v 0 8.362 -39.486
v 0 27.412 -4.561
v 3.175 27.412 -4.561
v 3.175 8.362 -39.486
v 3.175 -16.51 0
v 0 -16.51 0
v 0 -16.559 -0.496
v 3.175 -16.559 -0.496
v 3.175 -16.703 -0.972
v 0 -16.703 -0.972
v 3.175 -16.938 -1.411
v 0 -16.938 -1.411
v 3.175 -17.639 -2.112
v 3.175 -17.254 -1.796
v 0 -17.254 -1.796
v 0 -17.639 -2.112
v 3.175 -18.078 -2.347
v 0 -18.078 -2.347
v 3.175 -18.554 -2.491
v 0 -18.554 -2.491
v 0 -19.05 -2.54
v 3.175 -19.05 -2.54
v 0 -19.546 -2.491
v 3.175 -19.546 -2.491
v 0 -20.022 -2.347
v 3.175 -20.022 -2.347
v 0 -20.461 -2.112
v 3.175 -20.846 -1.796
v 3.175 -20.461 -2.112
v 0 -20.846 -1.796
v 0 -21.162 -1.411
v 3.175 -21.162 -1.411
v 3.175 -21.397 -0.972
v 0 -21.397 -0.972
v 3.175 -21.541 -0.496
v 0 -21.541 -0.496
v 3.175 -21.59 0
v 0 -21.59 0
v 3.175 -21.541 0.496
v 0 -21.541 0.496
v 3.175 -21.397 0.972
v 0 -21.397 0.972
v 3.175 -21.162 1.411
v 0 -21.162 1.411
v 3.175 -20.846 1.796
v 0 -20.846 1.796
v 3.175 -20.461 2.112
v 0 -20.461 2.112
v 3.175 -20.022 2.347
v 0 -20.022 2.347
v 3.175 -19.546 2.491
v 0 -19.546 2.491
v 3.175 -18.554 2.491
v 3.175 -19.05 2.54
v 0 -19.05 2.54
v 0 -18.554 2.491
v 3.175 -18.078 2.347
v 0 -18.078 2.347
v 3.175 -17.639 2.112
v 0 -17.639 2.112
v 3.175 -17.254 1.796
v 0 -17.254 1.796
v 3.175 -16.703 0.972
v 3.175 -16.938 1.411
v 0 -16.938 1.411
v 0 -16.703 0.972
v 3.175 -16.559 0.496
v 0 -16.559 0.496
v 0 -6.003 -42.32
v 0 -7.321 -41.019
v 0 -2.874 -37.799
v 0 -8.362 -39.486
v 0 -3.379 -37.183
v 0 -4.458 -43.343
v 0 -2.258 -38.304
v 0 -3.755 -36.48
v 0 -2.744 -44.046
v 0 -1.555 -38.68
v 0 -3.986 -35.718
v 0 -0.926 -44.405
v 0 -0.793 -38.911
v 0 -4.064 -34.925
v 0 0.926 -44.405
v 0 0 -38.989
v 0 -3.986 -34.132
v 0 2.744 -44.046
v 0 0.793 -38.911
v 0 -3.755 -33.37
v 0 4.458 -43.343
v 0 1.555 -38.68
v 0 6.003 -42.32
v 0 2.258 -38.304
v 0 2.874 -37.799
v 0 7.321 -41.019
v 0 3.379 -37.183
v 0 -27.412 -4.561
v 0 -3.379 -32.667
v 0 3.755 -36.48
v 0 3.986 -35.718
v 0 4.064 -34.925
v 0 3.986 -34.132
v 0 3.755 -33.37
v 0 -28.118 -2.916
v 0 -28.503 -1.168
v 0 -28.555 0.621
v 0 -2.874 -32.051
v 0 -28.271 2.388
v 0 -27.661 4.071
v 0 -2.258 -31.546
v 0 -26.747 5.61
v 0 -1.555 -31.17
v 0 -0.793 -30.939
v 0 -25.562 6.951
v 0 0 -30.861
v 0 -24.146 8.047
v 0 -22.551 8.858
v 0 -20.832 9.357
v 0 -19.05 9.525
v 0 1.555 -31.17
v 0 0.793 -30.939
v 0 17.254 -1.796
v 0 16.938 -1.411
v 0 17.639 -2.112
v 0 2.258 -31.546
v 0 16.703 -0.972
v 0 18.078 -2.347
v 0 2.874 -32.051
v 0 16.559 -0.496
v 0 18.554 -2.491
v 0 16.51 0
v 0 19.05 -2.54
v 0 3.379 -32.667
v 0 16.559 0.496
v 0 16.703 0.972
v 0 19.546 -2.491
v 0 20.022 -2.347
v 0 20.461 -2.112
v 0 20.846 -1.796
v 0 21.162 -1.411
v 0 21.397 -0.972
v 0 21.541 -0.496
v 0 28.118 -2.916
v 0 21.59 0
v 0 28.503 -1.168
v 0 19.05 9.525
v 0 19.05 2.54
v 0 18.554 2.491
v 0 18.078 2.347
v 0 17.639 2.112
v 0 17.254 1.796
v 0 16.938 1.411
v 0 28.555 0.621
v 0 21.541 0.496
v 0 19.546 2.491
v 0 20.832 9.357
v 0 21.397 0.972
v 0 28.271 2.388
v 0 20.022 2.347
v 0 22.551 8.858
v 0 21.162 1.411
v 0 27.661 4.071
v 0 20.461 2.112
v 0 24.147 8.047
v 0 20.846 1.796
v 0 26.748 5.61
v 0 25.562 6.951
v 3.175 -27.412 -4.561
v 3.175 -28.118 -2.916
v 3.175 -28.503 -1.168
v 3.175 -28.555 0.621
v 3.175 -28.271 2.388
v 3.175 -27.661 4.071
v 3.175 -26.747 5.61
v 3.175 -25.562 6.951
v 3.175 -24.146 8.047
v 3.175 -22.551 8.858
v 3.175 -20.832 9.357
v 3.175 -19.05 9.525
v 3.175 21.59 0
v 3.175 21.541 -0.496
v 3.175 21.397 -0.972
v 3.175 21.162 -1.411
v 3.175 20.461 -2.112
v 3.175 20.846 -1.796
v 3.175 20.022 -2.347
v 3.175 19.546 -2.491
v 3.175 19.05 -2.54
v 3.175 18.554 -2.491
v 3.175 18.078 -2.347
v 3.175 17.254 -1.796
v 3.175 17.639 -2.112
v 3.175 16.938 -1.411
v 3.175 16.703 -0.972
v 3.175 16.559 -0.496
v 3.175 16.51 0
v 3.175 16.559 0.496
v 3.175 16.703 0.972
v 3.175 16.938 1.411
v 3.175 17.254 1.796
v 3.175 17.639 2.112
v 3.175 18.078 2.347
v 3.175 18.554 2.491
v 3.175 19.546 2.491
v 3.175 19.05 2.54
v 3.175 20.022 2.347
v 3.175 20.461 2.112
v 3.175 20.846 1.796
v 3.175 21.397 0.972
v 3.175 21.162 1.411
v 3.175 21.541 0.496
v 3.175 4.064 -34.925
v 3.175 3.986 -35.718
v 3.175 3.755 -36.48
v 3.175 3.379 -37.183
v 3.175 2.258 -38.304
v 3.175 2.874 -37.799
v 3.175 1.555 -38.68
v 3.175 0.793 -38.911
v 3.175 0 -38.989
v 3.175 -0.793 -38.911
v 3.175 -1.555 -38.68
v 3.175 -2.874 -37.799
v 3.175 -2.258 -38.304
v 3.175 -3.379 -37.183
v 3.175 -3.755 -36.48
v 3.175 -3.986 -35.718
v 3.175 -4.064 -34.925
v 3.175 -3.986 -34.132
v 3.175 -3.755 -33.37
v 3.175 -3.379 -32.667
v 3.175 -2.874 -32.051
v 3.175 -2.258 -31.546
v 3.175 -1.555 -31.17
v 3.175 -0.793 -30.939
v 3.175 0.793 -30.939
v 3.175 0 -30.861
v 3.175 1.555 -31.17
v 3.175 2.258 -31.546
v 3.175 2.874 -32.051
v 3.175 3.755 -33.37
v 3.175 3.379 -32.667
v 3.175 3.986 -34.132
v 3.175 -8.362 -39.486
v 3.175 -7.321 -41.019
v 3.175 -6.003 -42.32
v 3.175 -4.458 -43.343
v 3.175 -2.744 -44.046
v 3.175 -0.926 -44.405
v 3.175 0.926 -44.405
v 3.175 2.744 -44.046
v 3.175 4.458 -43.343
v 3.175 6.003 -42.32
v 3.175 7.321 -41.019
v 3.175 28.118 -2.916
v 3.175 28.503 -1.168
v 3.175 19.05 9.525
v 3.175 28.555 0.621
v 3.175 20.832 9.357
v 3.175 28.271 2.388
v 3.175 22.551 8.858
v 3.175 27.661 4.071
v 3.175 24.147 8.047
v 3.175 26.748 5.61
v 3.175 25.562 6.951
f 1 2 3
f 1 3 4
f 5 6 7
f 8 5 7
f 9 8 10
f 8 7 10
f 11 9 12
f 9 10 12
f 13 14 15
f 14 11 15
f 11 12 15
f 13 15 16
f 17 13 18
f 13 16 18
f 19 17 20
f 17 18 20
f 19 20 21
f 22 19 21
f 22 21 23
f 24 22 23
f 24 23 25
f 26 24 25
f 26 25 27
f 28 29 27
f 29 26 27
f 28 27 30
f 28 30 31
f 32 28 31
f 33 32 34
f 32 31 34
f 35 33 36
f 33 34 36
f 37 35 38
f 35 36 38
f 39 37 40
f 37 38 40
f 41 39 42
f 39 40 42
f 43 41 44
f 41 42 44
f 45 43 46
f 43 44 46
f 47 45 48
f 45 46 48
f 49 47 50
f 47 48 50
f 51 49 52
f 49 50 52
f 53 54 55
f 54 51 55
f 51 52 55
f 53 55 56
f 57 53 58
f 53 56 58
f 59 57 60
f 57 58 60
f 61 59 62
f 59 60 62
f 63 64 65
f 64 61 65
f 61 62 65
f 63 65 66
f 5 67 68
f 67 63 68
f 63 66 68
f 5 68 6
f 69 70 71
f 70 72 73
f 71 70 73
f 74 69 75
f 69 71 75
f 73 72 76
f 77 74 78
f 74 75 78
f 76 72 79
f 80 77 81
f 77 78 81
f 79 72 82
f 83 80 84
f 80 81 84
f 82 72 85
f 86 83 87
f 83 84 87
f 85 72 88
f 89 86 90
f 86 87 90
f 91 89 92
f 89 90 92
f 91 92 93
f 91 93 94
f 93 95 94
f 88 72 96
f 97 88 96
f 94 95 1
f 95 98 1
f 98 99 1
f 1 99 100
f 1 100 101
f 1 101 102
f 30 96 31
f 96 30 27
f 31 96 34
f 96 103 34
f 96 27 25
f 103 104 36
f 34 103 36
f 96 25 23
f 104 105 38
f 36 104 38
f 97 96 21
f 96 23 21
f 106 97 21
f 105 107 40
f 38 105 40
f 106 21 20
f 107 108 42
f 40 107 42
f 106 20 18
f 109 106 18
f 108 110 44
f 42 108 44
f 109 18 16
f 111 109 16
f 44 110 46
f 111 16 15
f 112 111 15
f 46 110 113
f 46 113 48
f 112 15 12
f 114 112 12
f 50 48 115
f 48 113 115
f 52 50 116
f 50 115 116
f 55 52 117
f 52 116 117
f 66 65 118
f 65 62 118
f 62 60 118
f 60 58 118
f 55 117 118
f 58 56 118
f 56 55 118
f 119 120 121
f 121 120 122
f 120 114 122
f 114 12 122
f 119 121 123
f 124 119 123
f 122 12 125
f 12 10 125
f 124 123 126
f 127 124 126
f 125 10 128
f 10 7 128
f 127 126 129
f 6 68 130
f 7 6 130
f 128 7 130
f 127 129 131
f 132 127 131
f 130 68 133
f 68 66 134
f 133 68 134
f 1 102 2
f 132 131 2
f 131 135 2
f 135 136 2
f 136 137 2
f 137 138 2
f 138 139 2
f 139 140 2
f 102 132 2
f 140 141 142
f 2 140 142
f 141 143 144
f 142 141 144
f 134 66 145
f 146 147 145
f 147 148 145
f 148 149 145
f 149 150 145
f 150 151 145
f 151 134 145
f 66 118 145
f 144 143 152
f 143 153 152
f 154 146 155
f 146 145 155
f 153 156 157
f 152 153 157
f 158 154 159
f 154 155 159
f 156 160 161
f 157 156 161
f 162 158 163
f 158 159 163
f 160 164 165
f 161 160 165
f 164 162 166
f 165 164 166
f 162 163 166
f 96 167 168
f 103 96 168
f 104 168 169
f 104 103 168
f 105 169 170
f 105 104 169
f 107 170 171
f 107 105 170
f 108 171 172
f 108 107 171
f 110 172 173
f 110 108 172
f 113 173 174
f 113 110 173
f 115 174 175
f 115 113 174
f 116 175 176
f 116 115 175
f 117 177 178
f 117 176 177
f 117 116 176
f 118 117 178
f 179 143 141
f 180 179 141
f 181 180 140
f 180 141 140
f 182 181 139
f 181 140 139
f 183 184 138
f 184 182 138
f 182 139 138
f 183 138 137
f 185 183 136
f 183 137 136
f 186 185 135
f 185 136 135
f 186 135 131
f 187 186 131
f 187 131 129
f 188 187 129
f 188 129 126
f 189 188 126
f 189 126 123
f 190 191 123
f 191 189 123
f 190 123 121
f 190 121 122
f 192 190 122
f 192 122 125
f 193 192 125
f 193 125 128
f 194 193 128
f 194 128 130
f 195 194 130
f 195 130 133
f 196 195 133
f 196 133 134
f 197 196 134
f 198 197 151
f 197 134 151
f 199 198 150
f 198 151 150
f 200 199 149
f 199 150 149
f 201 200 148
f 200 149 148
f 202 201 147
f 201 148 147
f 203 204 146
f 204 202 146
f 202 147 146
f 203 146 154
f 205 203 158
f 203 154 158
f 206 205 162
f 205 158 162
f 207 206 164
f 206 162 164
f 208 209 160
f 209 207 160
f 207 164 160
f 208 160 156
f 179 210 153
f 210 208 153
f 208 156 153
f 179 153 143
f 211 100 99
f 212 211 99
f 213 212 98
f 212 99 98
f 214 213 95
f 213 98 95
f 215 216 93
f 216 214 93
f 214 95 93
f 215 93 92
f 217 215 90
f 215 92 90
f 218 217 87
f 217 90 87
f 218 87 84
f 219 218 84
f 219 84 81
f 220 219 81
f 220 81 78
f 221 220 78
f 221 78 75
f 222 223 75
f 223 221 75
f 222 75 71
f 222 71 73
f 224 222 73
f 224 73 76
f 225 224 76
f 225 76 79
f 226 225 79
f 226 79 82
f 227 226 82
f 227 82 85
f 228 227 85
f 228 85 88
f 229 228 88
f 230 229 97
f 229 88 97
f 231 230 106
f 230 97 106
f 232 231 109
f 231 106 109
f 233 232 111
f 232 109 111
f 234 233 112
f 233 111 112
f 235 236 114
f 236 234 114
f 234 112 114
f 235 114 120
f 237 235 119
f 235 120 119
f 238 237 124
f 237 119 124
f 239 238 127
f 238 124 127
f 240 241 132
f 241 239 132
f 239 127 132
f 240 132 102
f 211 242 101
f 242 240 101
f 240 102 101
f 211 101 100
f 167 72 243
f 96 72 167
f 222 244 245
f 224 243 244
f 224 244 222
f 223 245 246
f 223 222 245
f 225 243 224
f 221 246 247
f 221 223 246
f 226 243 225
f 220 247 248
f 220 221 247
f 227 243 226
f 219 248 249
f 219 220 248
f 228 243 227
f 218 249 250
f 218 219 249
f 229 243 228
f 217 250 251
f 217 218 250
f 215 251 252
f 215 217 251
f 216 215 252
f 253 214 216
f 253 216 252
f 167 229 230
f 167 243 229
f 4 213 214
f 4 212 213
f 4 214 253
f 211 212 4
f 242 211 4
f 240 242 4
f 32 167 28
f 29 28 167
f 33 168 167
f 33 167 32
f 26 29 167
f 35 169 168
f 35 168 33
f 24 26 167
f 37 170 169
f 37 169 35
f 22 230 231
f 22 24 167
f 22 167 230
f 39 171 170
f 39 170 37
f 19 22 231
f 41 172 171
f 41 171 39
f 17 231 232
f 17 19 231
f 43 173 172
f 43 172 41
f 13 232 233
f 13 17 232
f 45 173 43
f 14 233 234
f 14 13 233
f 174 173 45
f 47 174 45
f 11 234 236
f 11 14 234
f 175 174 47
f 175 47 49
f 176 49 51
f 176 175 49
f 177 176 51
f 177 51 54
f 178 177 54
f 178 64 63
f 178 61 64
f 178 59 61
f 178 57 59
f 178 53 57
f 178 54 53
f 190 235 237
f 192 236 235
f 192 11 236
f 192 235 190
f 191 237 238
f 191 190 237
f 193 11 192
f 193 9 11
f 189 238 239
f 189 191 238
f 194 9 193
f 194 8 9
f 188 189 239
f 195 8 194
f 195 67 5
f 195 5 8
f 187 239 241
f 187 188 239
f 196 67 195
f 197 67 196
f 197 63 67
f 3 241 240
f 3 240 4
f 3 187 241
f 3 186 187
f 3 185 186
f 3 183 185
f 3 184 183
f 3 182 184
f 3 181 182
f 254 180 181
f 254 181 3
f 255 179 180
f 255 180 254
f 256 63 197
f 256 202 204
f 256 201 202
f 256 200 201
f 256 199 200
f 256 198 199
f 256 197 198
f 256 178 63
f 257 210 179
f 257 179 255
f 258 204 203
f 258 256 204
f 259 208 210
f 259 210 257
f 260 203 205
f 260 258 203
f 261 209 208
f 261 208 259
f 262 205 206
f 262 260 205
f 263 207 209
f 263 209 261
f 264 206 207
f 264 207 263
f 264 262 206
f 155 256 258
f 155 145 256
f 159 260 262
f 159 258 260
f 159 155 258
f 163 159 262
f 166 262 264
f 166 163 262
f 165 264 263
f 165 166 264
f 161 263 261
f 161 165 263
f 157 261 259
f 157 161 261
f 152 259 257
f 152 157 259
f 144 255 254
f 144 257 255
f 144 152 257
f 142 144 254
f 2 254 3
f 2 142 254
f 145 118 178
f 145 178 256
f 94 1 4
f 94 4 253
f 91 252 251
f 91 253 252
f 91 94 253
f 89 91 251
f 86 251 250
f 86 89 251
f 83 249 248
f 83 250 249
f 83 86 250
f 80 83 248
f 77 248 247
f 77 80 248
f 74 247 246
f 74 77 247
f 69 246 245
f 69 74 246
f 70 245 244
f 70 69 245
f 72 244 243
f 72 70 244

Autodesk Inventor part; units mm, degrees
ref_plane "YZ Plane" through (0, 0, 0) normal (1, 0, 0) x (0, 1, 0)
ref_plane "XZ Plane" through (0, 0, 0) normal (0, 1, 0) x (-1, 0, 0)
ref_plane "XY Plane" through (0, 0, 0) normal (0, 0, 1) x (1, 0, 0)
sketch "Sketch1" plane through (0, 0, 0) normal (1, 0, 0) x (0, 1, 0)
  line L0 (19.05, 0) -> (-19.05, 0) construction
  circle A0 centre (19.05, 0) radius 2.54
  circle A1 centre (-19.05, 0) radius 2.54
  circle A2 centre (0, -34.925) radius 4.064
  line L1 (0, 0) -> (0, -34.925) construction
  arc A3 (27.412, -4.5611) -> (19.05, 9.525) centre (19.05, 0) ccw
  arc A4 (-19.05, 9.525) -> (-27.412, -4.5611) centre (-19.05, 0) ccw
  arc A5 (-8.362, -39.4861) -> (8.362, -39.4861) centre (0, -34.925) ccw
  line L2 (-8.362, -39.4861) -> (-27.412, -4.5611)
  line L3 (-19.05, 9.525) -> (19.05, 9.525)
  line L4 (27.412, -4.5611) -> (8.362, -39.4861)
  dimension "d0" = 5.08
  dimension "d2" = 38.1
  dimension "d3" = 8.128
  dimension "d4" = 34.925
  dimension "d5" = 9.525
extrude "Extrusion1" add sketch "Sketch1" along normal blind 3.175
properties part number "roller plate" material "Aluminum 6061"
